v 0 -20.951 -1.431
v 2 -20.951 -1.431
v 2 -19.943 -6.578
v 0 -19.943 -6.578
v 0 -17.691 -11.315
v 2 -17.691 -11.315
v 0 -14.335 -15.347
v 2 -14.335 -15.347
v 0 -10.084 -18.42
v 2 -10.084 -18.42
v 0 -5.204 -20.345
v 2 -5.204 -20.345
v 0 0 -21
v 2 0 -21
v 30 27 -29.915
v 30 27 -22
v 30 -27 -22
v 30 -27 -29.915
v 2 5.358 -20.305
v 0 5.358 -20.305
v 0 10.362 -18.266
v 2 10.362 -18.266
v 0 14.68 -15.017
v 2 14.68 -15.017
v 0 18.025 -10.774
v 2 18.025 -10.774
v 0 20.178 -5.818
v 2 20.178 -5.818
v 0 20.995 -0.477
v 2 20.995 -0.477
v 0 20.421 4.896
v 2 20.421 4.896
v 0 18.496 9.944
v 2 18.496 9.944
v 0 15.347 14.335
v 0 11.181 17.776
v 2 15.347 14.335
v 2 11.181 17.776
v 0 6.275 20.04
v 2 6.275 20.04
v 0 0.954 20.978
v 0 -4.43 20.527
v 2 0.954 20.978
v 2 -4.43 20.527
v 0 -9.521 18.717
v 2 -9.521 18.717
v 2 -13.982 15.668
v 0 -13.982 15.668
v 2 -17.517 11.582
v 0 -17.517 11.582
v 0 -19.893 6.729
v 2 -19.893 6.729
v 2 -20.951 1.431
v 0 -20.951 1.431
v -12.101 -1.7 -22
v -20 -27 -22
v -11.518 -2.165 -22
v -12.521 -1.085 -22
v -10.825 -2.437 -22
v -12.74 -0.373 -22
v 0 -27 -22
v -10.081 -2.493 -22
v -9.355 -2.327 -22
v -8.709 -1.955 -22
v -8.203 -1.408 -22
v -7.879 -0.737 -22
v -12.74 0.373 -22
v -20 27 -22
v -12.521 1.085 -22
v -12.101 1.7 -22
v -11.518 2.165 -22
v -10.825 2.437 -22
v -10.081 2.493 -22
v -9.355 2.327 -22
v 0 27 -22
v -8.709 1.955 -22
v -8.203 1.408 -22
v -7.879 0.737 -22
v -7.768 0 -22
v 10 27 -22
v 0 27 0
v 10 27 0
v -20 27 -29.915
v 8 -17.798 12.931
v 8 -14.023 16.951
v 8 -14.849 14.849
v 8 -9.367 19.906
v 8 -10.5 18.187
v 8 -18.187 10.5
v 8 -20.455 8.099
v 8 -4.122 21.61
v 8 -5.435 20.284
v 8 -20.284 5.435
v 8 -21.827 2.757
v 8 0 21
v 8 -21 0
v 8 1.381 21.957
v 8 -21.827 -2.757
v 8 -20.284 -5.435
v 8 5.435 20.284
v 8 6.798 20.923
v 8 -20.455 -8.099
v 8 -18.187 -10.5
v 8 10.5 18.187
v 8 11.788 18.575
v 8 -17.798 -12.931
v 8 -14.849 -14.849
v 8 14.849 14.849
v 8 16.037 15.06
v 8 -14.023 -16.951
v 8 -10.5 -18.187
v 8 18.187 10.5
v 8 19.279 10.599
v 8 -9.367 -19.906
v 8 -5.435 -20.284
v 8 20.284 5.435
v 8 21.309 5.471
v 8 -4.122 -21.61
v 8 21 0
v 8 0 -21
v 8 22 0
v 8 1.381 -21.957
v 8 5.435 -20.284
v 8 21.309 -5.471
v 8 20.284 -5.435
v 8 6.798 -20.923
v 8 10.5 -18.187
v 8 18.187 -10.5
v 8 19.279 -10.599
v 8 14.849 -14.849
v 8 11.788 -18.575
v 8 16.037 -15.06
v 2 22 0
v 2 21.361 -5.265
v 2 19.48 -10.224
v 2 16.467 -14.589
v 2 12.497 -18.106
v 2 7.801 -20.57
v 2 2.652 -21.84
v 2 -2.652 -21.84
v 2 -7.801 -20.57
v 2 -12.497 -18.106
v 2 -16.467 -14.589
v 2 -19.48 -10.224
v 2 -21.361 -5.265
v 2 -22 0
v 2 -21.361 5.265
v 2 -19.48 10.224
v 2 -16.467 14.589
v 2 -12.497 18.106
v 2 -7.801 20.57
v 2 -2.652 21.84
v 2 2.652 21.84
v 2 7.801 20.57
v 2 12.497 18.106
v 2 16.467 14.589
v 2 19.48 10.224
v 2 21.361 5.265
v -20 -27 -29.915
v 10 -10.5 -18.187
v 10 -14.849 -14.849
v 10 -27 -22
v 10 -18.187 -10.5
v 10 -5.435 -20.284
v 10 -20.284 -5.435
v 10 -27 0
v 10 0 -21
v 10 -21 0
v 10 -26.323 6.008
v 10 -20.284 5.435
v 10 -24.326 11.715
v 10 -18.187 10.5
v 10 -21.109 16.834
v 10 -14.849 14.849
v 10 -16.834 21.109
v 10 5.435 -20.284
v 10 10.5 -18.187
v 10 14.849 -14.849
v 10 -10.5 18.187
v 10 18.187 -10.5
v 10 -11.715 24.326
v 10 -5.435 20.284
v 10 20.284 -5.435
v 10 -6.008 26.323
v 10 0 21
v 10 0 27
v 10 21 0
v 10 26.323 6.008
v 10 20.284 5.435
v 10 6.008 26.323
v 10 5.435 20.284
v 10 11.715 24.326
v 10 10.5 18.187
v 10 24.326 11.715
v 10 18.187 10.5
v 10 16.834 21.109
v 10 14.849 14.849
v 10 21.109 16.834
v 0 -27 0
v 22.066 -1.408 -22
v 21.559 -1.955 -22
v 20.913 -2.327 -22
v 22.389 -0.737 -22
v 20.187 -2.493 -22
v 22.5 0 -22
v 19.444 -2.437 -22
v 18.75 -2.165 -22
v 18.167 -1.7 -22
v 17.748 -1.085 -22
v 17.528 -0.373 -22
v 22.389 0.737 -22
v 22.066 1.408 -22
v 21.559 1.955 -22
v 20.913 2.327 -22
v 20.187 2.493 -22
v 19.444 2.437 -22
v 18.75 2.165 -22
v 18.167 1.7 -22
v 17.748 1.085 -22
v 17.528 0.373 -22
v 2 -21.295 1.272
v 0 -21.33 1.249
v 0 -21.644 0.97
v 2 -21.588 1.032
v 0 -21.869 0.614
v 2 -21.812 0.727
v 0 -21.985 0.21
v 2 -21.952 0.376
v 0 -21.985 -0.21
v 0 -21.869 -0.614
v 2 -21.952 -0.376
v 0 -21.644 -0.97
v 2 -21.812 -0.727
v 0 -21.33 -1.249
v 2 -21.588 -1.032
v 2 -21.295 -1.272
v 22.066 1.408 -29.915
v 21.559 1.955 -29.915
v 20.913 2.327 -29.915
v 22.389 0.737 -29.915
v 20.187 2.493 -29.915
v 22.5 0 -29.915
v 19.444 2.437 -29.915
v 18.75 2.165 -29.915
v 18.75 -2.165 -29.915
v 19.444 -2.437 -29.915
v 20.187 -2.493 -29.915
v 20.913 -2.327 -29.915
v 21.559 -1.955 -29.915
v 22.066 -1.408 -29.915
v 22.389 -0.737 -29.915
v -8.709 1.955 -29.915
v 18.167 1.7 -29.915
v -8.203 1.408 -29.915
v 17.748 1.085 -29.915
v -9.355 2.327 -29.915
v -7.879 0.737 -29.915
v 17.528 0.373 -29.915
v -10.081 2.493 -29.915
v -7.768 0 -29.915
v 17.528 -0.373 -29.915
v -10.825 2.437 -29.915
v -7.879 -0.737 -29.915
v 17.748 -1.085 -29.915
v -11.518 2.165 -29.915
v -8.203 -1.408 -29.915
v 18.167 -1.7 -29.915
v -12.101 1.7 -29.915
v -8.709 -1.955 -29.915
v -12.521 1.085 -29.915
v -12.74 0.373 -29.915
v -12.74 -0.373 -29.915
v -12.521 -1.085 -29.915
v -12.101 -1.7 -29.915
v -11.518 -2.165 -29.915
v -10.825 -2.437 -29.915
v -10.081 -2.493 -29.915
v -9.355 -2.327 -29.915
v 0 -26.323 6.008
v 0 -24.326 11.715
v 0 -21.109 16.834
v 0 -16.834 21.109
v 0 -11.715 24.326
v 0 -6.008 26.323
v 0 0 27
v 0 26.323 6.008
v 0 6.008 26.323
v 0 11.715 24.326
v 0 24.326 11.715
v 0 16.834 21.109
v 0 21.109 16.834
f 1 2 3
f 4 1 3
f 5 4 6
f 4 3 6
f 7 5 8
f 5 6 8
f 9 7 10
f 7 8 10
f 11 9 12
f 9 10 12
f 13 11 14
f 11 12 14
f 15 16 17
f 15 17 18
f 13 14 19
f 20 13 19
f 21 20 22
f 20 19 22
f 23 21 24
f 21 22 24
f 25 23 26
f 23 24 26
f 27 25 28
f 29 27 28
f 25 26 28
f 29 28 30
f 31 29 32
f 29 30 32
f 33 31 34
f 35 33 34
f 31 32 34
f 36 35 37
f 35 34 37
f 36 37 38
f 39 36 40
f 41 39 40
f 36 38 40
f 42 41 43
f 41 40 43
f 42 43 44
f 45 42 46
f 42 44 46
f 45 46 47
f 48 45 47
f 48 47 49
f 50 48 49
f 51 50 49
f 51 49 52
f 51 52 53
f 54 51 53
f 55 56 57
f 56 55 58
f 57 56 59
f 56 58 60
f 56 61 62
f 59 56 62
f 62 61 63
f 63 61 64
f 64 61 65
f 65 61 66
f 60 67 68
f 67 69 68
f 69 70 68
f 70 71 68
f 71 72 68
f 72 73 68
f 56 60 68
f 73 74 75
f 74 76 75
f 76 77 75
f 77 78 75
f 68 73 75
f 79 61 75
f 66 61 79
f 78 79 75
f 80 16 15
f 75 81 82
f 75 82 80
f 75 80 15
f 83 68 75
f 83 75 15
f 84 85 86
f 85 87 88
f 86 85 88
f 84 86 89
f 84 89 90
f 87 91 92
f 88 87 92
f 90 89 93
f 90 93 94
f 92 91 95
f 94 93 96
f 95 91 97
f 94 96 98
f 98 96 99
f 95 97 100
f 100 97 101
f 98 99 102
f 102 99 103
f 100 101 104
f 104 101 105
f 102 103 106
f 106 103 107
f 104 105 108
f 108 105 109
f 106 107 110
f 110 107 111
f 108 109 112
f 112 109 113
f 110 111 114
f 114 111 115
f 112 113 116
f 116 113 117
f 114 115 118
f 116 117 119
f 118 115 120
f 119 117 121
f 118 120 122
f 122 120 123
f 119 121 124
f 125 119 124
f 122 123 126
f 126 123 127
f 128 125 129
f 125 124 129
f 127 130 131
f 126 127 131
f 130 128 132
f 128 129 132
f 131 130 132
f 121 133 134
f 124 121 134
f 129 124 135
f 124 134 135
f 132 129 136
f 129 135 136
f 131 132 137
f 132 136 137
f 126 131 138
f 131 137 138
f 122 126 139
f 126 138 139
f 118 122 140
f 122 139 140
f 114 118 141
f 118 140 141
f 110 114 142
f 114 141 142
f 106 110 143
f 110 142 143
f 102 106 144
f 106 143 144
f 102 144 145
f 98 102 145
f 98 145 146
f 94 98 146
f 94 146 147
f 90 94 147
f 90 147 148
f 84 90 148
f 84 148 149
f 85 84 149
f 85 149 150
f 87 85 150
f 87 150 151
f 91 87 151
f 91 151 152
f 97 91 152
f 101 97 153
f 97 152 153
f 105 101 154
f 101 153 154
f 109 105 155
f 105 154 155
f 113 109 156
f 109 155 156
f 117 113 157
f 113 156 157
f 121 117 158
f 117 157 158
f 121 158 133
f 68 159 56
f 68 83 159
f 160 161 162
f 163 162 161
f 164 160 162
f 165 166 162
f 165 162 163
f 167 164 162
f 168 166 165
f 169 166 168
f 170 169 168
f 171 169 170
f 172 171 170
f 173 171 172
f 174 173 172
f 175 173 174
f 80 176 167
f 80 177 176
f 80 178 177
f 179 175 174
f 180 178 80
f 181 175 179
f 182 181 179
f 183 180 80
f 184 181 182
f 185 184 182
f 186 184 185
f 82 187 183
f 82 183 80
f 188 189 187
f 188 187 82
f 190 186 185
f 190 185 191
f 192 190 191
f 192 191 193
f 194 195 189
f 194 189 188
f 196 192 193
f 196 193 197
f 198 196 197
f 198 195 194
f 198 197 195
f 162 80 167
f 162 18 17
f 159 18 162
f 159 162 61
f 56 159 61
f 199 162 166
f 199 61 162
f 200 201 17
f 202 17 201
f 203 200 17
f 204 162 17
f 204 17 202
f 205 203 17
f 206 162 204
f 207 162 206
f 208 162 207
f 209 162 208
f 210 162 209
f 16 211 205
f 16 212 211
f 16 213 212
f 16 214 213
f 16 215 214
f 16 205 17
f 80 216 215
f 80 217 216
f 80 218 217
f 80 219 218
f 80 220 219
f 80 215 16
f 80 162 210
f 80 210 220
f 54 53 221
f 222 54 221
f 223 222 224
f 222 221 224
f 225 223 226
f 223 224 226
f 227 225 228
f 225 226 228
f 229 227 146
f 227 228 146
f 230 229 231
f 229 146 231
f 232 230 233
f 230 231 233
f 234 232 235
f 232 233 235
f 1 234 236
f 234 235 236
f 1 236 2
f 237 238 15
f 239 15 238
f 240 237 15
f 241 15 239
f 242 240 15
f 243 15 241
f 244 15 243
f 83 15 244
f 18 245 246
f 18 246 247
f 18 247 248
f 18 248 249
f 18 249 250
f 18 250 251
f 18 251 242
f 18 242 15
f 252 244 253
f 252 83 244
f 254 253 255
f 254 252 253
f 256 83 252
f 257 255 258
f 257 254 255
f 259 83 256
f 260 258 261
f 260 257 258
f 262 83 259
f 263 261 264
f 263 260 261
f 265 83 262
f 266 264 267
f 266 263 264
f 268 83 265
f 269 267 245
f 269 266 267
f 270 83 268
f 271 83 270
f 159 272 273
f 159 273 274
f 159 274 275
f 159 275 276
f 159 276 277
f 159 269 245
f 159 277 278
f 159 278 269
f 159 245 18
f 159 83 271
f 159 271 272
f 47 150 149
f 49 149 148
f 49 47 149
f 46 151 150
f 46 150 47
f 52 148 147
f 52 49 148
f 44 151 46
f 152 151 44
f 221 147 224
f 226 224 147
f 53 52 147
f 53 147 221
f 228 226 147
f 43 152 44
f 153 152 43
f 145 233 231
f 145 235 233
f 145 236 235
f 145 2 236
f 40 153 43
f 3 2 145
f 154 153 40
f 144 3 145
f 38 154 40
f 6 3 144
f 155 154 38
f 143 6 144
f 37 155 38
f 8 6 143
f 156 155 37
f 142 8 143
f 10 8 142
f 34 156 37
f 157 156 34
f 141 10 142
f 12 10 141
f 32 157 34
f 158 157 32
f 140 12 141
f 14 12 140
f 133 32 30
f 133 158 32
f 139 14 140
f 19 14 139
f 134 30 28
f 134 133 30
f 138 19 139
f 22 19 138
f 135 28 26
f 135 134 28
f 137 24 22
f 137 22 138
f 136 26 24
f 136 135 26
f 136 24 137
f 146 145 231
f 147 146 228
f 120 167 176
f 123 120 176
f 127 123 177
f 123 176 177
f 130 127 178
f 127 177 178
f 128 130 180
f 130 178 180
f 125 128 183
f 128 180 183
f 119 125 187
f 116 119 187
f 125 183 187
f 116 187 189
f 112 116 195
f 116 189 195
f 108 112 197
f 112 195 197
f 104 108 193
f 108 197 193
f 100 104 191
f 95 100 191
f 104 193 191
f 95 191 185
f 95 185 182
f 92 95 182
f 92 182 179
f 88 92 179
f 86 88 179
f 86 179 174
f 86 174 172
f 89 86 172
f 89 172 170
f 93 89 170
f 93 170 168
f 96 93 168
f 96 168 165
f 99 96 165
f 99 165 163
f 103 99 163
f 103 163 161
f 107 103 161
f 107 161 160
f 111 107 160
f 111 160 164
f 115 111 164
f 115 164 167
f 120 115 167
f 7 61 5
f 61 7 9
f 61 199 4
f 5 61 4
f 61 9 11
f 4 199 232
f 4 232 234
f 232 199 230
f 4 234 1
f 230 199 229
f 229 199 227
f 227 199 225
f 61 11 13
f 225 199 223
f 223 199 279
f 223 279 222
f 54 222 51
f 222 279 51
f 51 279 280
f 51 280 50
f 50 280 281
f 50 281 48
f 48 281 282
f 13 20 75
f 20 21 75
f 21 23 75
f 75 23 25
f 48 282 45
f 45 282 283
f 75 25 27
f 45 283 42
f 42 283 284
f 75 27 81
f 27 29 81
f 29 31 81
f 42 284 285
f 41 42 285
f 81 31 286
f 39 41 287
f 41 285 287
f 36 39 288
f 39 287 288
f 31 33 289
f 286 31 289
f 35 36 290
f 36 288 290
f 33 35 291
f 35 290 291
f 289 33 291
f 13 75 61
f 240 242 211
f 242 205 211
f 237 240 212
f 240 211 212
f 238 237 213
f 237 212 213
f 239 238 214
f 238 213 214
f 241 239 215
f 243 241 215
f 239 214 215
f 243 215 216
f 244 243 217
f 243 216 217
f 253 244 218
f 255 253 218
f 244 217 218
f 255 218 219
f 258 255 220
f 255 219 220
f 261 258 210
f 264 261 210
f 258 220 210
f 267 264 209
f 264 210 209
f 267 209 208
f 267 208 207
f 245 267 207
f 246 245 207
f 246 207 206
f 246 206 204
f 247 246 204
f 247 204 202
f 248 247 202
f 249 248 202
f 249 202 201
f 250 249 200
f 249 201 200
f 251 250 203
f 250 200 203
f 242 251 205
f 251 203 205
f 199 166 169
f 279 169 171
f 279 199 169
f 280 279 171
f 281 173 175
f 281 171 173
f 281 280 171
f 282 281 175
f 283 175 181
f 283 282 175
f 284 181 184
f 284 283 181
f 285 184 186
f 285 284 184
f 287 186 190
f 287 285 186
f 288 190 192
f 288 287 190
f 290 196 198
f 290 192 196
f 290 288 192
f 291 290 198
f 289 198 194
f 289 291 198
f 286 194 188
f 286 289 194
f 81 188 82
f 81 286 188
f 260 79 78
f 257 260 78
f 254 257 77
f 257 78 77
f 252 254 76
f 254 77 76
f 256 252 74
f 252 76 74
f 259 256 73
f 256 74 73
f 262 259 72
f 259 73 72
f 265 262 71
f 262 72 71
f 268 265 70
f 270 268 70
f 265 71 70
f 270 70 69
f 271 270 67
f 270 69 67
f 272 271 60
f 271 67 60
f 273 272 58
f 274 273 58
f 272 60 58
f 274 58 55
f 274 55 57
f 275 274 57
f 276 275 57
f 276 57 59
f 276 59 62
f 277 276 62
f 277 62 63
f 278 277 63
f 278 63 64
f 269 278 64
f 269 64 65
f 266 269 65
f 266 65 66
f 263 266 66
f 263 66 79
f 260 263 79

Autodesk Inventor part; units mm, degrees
ref_plane "YZ Plane" through (0, 0, 0) normal (1, 0, 0) x (0, 1, 0)
ref_plane "XZ Plane" through (0, 0, 0) normal (0, 1, 0) x (-1, 0, 0)
sketch "Sketch15" plane through (0, 0, 0) normal (1, 0, 0) x (0, 1, 0)
  circle A0 centre (0, 0) radius 22
  circle A1 centre (0, 0) radius 27
  line L0 (27, 0) -> (27, -29.9149)
  line L1 (27, -29.9149) -> (-27, -29.9149)
  line L2 (-27, -29.9149) -> (-27, 0)
  dimension "d51" = 44
  dimension "d52" = 54
extrude "Extrusion11" add sketch "Sketch15" along normal blind 10
sketch "Sketch16" plane through (10, 0, 0) normal (1, 0, 0) x (0, 0, -1)
  line L0 (29.9149, -27) -> (29.9149, 27) projected
  circle A0 centre (0, 0) radius 22 projected
  line L1 (29.9149, 27) -> (22, 27)
  line L2 (22, 27) -> (22, 0)
  line L3 (22, 0) -> (29.9149, 0)
  line L4 (29.9149, 0) -> (29.9149, 27)
  line L5 (0, -27) -> (29.9149, -27) projected
  line L6 (22, 0) -> (29.9149, 0)
  line L7 (29.9149, 0) -> (29.9149, -27)
  line L8 (29.9149, -27) -> (22, -27)
  line L9 (22, -27) -> (22, 0)
extrude "Extrusion12" add sketch "Sketch16" along normal blind 20 contours L5 L9 L3 L0 | L3 L2 L1 L0
sketch "Sketch17" plane through (0, 0, 0) normal (-1, 0, 0) x (0, 0, 1)
  line L0 (-29.9149, -27) -> (-29.9149, 27) projected
  circle A0 centre (0, 0) radius 22 projected
  line L1 (-29.9149, 27) -> (-22, 27)
  line L2 (-22, 27) -> (-22, 0)
  line L3 (-22, 0) -> (-29.9149, 0)
  line L4 (-29.9149, 0) -> (-29.9149, 27)
  line L5 (0, -27) -> (-29.9149, -27) projected
  line L6 (-22, 0) -> (-29.9149, 0)
  line L7 (-29.9149, 0) -> (-29.9149, -27)
  line L8 (-29.9149, -27) -> (-22, -27)
  line L9 (-22, -27) -> (-22, 0)
extrude "Extrusion13" add sketch "Sketch17" along normal blind 20 contours L0 L3 L9 L5 | L0 L1 L2 L3
ref_plane "Work Plane8" through (0, 0, 0) normal (0, -1, 0) x (1, 0, 0)
sketch "Sketch18" plane through (0, 0, 0) normal (0, -1, 0) x (1, 0, 0)
  line L0 (0, 0) -> (0, -22)
  line L1 (0, -22) -> (2, -22)
  line L2 (10, -22) -> (0, -22) projected
  line L3 (0, -22) -> (0, -21)
  line L4 (0, -21) -> (2, -21)
  line L5 (2, -22) -> (2, -21)
  line L6 (10, -22) -> (8, -22)
  line L7 (8, -22) -> (8, -21)
  line L8 (8, -21) -> (10, -21)
  line L9 (10, -21) -> (10, -22)
  line L10 (-30, 0) -> (40, 0) projected
  dimension "d59" = 2
  dimension "d60" = 1
  dimension "d61" = 2
  dimension "d62" = 1
revolve "Revolution3" add sketch "Sketch18" angle 360 about axis through (-10, 0, 0) along (1, 0, 0)
sketch "Sketch19" plane through (10, -27, -22) normal (0, 0, 1) x (1, 0, 0)
  line L0 (20, 54) -> (20, 0) projected
  line L1 (20, 27) -> (10, 27)
  line L2 (-30.2682, 27) -> (-20.2682, 27)
  circle A0 centre (-20.2682, 27) radius 2.5
  circle A1 centre (10, 27) radius 2.5
  point P0 (-10, 27)
  dimension "d64" = 10
  dimension "d65" = 10
  dimension "d66" = 5
  dimension "d67" = 5
extrude "Extrusion14" cut sketch "Sketch19" against normal blind 20
sketch "Sketch20" plane through (2, 0, 0) normal (1, 0, 0) x (0, 0, -1)
  circle A0 centre (0, 0) radius 22 projected
  line L0 (0, -22) -> (0, -20.5)
  circle A1 centre (0, -20.5) radius 1.5
  dimension "d71" = 1.5
extrude "Extrusion15" cut sketch "Sketch20" against normal blind 20 contours A1
properties part number "antenna_rad_outter"
